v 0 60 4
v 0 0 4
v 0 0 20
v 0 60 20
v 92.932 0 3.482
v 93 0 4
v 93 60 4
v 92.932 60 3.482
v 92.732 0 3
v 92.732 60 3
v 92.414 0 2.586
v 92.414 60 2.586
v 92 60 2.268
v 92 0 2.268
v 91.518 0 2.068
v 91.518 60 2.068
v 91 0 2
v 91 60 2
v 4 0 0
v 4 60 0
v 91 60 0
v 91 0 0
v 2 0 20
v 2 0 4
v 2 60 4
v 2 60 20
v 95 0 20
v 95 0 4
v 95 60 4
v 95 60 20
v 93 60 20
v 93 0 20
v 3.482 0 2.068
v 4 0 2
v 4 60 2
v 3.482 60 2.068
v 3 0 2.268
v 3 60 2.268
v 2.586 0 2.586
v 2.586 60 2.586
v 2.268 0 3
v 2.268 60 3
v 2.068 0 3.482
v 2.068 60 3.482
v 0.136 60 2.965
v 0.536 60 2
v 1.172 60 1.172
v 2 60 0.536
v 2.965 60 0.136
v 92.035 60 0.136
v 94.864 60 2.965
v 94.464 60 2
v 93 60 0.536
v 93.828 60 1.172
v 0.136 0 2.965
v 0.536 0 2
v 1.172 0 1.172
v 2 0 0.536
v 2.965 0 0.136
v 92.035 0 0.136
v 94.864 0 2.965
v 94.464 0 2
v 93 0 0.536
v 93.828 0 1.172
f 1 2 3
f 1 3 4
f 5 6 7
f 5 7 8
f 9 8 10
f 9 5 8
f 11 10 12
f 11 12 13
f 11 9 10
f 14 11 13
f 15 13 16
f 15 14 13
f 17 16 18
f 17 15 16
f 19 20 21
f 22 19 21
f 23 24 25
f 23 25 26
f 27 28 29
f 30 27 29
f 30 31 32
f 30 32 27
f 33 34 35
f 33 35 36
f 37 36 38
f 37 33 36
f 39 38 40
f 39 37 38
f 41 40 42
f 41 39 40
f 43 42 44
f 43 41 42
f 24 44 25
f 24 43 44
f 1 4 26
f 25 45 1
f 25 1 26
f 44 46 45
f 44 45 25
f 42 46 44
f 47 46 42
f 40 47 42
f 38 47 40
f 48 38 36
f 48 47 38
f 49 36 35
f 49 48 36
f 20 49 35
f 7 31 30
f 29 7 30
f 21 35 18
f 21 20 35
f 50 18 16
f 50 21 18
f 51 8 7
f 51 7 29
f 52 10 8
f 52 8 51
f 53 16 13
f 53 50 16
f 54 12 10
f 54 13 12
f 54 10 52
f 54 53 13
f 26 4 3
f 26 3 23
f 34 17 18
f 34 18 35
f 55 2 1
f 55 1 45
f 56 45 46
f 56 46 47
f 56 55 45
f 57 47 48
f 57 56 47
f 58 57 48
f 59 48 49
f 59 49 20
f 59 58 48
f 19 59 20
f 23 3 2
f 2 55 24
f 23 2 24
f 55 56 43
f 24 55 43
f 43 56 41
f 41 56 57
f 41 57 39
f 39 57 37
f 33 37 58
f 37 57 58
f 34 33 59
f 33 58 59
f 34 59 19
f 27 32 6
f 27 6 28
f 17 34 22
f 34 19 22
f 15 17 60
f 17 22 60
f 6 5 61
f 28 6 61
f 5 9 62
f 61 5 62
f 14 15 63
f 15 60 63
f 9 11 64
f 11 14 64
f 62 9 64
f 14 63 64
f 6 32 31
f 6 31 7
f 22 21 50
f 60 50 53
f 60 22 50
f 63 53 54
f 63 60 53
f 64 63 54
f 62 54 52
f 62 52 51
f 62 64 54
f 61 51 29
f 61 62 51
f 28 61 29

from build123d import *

# Parameters (mm, degrees)
SZKIC1_W                    = 95
SZKIC1_H                    = 60
DODANIE_WYCI_GNI_CIE1_DEPTH = 20
KONWERTUJ_BRY_1_DEPTH       = 60


# Read off the part's stored shape, not the designer's step: Konwertuj bryłę1
with BuildPart() as part:
    # Szkic1 → Dodanie-wyciągnięcie1 (new body)
    with BuildSketch(Plane.XY):
        with Locations((47.5, 30)):
            Rectangle(SZKIC1_W, SZKIC1_H)
    extrude(amount=DODANIE_WYCI_GNI_CIE1_DEPTH)

    # Konwertuj bryłę1 outline → Konwertuj bryłę1 (cut)
    with BuildSketch(Plane(origin=(0, 0, 0), x_dir=(1, 0, 0), z_dir=(0, 1, 0))):
        with BuildLine():
            Line((95, 0), (91, 0))
            ThreePointArc((91, 0), (93.828427125, -1.171572875), (95, -4))
            Line((95, -4), (95, 0))
        make_face()
        with BuildLine():
            ThreePointArc((0, -4), (1.171572875, -1.171572875), (4, 0))
            Line((4, 0), (0, 0))
            Line((0, 0), (0, -4))
        make_face()
        with BuildLine():
            Line((2, -20), (93, -20))
            Line((93, -20), (93, -4))
            ThreePointArc((93, -4), (92.414213562, -2.585786438), (91, -2))
            Line((91, -2), (4, -2))
            ThreePointArc((4, -2), (2.585786438, -2.585786438), (2, -4))
            Line((2, -4), (2, -20))
        make_face()
    extrude(amount=KONWERTUJ_BRY_1_DEPTH, mode=Mode.SUBTRACT)


solid = part.part
